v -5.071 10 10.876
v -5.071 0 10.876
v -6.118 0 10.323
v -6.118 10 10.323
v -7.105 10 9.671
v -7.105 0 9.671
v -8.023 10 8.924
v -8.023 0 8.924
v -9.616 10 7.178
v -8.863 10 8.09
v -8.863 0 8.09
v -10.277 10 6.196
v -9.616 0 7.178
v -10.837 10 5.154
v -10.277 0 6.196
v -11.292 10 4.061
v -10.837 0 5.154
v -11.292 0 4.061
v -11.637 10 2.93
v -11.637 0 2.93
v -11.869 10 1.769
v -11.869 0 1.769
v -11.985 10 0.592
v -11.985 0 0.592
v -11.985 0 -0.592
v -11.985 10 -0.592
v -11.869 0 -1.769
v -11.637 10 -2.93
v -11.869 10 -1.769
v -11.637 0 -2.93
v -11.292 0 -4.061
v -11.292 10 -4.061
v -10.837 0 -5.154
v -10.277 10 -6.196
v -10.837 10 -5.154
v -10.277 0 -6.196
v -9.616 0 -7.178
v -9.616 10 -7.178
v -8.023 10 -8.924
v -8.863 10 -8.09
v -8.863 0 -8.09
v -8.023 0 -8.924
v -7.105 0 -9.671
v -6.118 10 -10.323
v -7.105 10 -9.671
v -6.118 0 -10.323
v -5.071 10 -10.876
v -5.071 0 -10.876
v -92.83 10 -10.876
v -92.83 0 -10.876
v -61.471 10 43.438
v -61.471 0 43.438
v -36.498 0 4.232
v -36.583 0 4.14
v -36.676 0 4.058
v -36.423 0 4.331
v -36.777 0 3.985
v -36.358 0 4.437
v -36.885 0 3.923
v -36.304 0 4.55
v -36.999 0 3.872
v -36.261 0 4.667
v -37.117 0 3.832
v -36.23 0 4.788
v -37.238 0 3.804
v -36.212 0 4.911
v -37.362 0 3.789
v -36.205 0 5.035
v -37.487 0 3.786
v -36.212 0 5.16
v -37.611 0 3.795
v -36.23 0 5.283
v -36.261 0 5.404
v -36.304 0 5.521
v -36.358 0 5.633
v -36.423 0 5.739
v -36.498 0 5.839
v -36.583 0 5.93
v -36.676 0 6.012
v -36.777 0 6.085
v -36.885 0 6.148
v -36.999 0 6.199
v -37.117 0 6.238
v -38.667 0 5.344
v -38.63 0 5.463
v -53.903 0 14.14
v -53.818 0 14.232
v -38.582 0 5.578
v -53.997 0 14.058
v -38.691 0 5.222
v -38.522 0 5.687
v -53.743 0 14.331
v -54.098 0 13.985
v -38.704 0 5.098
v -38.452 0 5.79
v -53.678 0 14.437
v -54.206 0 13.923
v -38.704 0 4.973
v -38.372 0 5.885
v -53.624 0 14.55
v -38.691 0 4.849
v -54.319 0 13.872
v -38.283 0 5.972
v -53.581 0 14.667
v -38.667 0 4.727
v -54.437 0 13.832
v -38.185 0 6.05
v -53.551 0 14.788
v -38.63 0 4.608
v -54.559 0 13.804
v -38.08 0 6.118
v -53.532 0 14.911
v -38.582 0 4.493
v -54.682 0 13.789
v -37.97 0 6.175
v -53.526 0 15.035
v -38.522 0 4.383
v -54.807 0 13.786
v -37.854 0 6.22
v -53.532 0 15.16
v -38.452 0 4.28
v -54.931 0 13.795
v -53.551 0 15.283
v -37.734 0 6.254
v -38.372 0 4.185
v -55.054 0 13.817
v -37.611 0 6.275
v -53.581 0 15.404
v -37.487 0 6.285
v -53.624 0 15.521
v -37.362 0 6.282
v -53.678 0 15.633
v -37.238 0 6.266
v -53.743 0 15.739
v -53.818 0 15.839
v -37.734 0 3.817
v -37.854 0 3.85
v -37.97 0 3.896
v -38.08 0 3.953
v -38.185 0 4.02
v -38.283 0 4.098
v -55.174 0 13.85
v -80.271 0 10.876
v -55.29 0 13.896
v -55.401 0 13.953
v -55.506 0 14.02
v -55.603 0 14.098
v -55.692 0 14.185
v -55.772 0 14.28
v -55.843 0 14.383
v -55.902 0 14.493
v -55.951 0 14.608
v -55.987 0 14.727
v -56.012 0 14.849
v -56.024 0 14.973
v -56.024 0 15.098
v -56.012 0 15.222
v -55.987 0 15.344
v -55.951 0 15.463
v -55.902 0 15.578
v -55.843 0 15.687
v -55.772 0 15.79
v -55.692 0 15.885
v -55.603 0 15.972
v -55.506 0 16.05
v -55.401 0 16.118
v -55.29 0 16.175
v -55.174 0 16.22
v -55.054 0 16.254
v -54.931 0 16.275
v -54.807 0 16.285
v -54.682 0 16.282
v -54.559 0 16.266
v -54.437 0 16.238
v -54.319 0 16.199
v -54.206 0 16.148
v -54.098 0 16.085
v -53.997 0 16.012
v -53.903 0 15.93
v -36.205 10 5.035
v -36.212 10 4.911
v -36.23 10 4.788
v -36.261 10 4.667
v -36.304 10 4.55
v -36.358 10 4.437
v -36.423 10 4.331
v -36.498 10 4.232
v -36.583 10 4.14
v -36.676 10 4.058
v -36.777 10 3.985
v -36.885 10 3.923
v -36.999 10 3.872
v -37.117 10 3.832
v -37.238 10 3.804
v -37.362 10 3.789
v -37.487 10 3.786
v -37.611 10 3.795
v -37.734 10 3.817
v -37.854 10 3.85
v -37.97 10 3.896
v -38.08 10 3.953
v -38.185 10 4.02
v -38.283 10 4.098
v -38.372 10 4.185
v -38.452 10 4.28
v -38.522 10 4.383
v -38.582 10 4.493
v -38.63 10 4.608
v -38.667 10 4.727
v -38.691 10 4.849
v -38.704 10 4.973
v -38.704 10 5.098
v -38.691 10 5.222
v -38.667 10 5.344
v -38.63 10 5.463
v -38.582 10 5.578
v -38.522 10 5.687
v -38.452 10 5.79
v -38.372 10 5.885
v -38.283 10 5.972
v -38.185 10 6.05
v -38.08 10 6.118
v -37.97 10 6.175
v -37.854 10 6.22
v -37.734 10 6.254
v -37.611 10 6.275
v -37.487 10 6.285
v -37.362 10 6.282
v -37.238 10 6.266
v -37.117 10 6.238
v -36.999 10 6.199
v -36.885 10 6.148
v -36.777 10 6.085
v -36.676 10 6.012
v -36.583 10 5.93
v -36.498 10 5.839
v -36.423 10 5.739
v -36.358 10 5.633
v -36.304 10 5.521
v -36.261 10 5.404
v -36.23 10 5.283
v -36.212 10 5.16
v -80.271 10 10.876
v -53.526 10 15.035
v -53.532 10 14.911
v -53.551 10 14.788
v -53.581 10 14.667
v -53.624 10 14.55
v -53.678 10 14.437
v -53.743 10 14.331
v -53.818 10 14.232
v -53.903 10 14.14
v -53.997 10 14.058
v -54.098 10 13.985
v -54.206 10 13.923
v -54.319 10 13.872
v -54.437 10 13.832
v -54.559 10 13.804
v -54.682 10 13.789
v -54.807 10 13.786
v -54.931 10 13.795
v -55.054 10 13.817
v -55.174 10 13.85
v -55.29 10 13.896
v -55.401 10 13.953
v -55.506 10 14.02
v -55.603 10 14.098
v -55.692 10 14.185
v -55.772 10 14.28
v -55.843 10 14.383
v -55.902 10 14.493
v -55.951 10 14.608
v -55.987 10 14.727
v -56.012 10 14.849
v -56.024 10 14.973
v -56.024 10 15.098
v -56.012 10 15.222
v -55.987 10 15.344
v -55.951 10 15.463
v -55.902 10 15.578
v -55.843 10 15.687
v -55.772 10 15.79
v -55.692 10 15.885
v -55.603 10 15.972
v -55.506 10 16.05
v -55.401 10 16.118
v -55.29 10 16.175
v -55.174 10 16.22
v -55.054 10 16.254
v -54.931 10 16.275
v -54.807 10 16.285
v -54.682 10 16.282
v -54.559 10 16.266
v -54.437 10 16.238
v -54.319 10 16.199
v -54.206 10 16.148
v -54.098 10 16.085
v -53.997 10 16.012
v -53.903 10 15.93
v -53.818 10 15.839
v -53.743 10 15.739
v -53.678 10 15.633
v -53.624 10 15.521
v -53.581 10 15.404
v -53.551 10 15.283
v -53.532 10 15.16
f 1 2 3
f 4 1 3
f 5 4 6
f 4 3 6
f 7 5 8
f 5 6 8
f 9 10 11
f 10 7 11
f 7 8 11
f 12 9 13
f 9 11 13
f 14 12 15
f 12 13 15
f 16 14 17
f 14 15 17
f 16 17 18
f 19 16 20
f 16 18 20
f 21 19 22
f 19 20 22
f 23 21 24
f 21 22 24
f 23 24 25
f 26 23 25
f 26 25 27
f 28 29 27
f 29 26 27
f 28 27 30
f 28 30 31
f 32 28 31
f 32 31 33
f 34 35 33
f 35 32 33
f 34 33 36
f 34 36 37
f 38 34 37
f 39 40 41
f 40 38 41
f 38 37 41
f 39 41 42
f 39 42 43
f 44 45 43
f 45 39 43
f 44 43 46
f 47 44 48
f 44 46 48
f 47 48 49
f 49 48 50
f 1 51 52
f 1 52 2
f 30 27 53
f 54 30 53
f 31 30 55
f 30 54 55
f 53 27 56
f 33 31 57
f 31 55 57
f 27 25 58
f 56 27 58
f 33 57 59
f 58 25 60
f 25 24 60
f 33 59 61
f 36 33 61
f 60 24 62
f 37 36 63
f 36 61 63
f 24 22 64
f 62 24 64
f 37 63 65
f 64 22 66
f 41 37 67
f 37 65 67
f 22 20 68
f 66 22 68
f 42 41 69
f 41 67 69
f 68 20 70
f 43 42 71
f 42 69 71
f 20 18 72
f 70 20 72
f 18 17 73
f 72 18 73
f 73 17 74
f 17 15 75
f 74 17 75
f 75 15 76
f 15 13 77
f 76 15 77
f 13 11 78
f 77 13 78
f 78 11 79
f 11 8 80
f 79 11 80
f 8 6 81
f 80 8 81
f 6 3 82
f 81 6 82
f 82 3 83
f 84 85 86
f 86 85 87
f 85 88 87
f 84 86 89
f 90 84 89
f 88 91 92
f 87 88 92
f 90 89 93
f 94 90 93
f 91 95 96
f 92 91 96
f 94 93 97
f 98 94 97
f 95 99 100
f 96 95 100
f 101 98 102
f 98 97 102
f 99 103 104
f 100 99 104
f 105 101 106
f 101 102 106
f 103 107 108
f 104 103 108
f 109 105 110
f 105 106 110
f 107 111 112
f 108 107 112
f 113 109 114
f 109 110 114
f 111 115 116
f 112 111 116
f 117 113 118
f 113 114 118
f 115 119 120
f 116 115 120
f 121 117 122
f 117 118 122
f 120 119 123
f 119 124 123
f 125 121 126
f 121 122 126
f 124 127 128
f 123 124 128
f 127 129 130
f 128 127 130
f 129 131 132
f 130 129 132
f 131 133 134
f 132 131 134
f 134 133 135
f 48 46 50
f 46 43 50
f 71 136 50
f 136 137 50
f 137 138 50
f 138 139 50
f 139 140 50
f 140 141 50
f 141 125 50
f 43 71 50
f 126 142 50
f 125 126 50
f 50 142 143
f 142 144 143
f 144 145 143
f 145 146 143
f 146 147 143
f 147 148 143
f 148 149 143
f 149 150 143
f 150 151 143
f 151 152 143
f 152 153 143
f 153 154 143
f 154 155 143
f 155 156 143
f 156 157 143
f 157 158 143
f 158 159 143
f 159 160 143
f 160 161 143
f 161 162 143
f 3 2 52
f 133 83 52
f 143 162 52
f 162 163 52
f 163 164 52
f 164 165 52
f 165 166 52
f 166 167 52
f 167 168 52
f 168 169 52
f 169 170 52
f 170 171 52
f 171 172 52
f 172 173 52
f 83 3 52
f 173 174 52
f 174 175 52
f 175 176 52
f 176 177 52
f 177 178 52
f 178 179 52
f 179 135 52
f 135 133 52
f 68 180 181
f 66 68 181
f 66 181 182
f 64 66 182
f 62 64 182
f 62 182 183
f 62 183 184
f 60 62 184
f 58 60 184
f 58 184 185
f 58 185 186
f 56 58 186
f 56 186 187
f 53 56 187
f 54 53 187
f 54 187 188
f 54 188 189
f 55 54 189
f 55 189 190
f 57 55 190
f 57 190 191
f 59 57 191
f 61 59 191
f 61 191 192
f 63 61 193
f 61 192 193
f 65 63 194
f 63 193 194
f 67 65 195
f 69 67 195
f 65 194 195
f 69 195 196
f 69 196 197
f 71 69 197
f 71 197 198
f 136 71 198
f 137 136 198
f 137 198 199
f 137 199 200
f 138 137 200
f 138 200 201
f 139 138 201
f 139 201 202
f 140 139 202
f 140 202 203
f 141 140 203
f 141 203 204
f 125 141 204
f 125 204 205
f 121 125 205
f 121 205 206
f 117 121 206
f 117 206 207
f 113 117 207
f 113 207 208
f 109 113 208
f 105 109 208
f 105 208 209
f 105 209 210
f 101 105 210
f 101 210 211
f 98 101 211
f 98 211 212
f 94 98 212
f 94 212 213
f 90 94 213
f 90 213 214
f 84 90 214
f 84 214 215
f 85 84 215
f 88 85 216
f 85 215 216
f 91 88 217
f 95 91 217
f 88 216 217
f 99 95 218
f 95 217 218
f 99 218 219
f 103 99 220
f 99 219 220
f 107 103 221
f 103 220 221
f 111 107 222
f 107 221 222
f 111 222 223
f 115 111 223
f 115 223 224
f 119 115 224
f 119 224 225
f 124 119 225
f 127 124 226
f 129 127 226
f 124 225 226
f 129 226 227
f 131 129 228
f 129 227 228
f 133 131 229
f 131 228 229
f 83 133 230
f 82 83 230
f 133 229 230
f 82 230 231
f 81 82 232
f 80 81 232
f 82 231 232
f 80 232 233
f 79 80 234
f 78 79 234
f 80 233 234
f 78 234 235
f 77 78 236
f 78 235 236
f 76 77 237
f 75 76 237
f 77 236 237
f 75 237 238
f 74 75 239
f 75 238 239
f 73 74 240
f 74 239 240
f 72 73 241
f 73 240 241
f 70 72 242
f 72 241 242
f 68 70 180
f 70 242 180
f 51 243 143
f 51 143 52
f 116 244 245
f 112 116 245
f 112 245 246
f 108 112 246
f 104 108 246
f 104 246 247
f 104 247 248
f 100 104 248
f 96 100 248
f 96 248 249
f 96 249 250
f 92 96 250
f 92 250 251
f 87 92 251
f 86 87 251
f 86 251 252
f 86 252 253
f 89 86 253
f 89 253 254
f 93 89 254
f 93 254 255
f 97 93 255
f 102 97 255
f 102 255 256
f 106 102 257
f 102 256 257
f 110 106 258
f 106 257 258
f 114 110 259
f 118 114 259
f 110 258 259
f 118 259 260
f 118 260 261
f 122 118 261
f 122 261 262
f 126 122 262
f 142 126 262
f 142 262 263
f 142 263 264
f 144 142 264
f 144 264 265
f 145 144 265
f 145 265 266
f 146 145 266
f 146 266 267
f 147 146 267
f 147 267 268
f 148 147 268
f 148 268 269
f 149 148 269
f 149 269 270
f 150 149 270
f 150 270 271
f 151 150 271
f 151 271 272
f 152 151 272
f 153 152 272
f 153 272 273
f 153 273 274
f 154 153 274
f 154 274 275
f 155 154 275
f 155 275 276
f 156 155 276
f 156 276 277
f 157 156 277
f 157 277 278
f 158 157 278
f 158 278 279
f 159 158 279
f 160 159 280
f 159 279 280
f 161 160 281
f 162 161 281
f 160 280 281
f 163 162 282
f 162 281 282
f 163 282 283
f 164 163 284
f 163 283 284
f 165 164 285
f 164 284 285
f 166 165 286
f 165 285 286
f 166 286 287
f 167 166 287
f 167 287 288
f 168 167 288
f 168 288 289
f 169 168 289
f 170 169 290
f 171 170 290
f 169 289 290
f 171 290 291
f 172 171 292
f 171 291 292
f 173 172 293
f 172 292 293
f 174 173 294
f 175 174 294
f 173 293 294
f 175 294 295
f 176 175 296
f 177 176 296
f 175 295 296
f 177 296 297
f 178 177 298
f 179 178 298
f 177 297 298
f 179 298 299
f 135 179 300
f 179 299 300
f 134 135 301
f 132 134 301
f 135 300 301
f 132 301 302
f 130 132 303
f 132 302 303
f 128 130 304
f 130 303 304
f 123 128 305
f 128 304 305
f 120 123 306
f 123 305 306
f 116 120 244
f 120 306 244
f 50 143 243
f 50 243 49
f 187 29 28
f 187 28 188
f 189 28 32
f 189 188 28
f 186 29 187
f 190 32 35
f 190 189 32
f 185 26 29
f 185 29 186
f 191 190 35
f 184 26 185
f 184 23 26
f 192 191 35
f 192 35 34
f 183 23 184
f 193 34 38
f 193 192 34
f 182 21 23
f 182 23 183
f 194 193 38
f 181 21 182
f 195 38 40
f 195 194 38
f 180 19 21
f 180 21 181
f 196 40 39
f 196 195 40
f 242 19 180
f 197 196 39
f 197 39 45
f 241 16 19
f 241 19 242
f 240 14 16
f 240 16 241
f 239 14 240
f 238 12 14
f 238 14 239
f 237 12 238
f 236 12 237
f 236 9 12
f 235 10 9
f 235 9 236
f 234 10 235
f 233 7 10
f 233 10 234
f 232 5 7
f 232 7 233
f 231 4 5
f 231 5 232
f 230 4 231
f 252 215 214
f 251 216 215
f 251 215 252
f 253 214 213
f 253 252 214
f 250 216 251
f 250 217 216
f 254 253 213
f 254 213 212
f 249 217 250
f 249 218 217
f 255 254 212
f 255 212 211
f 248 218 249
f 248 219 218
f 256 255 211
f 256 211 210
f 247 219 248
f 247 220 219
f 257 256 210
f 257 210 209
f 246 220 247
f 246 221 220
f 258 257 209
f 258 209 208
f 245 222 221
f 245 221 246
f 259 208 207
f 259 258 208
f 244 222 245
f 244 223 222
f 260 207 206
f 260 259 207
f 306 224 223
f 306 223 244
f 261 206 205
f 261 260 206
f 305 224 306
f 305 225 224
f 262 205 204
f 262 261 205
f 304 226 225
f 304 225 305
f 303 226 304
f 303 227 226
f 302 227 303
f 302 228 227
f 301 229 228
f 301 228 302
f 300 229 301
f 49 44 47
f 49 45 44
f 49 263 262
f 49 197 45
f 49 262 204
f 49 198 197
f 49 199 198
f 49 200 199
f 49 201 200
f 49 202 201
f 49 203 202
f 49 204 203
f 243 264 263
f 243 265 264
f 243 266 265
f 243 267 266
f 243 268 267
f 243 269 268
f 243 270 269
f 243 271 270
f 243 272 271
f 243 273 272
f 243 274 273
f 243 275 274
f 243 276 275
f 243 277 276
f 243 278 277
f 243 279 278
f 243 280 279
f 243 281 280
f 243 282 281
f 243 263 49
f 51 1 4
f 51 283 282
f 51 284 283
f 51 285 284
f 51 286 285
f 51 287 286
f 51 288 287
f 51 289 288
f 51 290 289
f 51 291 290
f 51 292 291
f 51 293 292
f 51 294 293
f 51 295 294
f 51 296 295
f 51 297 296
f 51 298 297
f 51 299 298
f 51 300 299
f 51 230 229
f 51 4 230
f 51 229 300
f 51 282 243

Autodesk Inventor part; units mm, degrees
ref_plane "YZ Plane" through (0, 0, 0) normal (1, 0, 0) x (0, 1, 0)
ref_plane "XZ Plane" through (0, 0, 0) normal (0, 1, 0) x (-1, 0, 0)
ref_plane "XY Plane" through (0, 0, 0) normal (0, 0, 1) x (1, 0, 0)
sketch "Sketch1" plane through (0, 0, 0) normal (0, 1, 0) x (-1, 0, 0)
  point P0 (0, 0)
sketch "Sketch2" plane through (0, 0, 0) normal (0, 1, 0) x (-1, 0, 0)
  circle A0 centre (0, 0) radius 10 construction
  arc A1 (5.0714, -10.8757) -> (5.0714, 10.8757) centre (0, 0) ccw
  line L0 (5.0714, 10.8757) -> (5.0714, -10.8757) construction
  line L1 (5.0714, -10.8757) -> (92.8296, -10.8757)
  line L2 (5.0714, -10.8757) -> (92.8296, -10.8757) construction
  line L3 (80.2714, 10.8757) -> (92.8296, -10.8757)
  line L4 (80.2714, 10.8757) -> (5.0714, 10.8757)
  dimension "d0" = 20
  dimension "d2" = 2
  dimension "d3" = 130
  dimension "d5" = 0
  dimension "d14" = 75.2
  dimension "d15" = 12.5582
extrude "Extrusion1" add sketch "Sketch2" along normal blind 10
sketch "Sketch3" plane through (0, 10, 0) normal (0, 1, 0) x (1, 0, 0)
  line L0 (-80.2714, -10.8757) -> (-92.8296, 10.8757) projected
  line L1 (-80.2714, -10.8757) -> (-61.4714, -43.4382)
  arc A0 (-5.0714, 10.8757) -> (-5.0714, -10.8757) centre (0, 0) ccw projected
  line L2 (-61.4714, -43.4382) -> (-5.0714, -10.8757)
  line L3 (-80.2714, -10.8757) -> (-5.0714, -10.8757) projected
  line L4 (-80.2714, -10.8757) -> (-5.0714, -10.8757)
  point P0 (-104.4015, 68.9975)
  point P1 (-92.8296, 10.8757)
extrude "Extrusion2" add sketch "Sketch3" against normal blind 10
sketch "Sketch4" plane through (0, 10, 0) normal (0, 1, 0) x (1, 0, 0)
  circle A0 centre (-54.7759, -15.0352) radius 1.25
  circle A1 centre (-37.4554, -5.0352) radius 1.25
  line L0 (-54.7759, -15.0352) -> (-37.4554, -5.0352) construction
  line L1 (-61.4714, -43.4382) -> (-5.0714, -10.8757) construction
  line L2 (-92.8296, 10.8757) -> (-61.4714, -43.4382) construction
  point P0 (0, 0)
  dimension "d16" = 2.5
  dimension "d17" = 2.5
  dimension "d18" = 20
  dimension "d19" = 20
  dimension "d20" = 21.25
extrude "Extrusion3" cut sketch "Sketch4" along normal through all both and the other way through all
properties part number "flipper-hug-left-2"
